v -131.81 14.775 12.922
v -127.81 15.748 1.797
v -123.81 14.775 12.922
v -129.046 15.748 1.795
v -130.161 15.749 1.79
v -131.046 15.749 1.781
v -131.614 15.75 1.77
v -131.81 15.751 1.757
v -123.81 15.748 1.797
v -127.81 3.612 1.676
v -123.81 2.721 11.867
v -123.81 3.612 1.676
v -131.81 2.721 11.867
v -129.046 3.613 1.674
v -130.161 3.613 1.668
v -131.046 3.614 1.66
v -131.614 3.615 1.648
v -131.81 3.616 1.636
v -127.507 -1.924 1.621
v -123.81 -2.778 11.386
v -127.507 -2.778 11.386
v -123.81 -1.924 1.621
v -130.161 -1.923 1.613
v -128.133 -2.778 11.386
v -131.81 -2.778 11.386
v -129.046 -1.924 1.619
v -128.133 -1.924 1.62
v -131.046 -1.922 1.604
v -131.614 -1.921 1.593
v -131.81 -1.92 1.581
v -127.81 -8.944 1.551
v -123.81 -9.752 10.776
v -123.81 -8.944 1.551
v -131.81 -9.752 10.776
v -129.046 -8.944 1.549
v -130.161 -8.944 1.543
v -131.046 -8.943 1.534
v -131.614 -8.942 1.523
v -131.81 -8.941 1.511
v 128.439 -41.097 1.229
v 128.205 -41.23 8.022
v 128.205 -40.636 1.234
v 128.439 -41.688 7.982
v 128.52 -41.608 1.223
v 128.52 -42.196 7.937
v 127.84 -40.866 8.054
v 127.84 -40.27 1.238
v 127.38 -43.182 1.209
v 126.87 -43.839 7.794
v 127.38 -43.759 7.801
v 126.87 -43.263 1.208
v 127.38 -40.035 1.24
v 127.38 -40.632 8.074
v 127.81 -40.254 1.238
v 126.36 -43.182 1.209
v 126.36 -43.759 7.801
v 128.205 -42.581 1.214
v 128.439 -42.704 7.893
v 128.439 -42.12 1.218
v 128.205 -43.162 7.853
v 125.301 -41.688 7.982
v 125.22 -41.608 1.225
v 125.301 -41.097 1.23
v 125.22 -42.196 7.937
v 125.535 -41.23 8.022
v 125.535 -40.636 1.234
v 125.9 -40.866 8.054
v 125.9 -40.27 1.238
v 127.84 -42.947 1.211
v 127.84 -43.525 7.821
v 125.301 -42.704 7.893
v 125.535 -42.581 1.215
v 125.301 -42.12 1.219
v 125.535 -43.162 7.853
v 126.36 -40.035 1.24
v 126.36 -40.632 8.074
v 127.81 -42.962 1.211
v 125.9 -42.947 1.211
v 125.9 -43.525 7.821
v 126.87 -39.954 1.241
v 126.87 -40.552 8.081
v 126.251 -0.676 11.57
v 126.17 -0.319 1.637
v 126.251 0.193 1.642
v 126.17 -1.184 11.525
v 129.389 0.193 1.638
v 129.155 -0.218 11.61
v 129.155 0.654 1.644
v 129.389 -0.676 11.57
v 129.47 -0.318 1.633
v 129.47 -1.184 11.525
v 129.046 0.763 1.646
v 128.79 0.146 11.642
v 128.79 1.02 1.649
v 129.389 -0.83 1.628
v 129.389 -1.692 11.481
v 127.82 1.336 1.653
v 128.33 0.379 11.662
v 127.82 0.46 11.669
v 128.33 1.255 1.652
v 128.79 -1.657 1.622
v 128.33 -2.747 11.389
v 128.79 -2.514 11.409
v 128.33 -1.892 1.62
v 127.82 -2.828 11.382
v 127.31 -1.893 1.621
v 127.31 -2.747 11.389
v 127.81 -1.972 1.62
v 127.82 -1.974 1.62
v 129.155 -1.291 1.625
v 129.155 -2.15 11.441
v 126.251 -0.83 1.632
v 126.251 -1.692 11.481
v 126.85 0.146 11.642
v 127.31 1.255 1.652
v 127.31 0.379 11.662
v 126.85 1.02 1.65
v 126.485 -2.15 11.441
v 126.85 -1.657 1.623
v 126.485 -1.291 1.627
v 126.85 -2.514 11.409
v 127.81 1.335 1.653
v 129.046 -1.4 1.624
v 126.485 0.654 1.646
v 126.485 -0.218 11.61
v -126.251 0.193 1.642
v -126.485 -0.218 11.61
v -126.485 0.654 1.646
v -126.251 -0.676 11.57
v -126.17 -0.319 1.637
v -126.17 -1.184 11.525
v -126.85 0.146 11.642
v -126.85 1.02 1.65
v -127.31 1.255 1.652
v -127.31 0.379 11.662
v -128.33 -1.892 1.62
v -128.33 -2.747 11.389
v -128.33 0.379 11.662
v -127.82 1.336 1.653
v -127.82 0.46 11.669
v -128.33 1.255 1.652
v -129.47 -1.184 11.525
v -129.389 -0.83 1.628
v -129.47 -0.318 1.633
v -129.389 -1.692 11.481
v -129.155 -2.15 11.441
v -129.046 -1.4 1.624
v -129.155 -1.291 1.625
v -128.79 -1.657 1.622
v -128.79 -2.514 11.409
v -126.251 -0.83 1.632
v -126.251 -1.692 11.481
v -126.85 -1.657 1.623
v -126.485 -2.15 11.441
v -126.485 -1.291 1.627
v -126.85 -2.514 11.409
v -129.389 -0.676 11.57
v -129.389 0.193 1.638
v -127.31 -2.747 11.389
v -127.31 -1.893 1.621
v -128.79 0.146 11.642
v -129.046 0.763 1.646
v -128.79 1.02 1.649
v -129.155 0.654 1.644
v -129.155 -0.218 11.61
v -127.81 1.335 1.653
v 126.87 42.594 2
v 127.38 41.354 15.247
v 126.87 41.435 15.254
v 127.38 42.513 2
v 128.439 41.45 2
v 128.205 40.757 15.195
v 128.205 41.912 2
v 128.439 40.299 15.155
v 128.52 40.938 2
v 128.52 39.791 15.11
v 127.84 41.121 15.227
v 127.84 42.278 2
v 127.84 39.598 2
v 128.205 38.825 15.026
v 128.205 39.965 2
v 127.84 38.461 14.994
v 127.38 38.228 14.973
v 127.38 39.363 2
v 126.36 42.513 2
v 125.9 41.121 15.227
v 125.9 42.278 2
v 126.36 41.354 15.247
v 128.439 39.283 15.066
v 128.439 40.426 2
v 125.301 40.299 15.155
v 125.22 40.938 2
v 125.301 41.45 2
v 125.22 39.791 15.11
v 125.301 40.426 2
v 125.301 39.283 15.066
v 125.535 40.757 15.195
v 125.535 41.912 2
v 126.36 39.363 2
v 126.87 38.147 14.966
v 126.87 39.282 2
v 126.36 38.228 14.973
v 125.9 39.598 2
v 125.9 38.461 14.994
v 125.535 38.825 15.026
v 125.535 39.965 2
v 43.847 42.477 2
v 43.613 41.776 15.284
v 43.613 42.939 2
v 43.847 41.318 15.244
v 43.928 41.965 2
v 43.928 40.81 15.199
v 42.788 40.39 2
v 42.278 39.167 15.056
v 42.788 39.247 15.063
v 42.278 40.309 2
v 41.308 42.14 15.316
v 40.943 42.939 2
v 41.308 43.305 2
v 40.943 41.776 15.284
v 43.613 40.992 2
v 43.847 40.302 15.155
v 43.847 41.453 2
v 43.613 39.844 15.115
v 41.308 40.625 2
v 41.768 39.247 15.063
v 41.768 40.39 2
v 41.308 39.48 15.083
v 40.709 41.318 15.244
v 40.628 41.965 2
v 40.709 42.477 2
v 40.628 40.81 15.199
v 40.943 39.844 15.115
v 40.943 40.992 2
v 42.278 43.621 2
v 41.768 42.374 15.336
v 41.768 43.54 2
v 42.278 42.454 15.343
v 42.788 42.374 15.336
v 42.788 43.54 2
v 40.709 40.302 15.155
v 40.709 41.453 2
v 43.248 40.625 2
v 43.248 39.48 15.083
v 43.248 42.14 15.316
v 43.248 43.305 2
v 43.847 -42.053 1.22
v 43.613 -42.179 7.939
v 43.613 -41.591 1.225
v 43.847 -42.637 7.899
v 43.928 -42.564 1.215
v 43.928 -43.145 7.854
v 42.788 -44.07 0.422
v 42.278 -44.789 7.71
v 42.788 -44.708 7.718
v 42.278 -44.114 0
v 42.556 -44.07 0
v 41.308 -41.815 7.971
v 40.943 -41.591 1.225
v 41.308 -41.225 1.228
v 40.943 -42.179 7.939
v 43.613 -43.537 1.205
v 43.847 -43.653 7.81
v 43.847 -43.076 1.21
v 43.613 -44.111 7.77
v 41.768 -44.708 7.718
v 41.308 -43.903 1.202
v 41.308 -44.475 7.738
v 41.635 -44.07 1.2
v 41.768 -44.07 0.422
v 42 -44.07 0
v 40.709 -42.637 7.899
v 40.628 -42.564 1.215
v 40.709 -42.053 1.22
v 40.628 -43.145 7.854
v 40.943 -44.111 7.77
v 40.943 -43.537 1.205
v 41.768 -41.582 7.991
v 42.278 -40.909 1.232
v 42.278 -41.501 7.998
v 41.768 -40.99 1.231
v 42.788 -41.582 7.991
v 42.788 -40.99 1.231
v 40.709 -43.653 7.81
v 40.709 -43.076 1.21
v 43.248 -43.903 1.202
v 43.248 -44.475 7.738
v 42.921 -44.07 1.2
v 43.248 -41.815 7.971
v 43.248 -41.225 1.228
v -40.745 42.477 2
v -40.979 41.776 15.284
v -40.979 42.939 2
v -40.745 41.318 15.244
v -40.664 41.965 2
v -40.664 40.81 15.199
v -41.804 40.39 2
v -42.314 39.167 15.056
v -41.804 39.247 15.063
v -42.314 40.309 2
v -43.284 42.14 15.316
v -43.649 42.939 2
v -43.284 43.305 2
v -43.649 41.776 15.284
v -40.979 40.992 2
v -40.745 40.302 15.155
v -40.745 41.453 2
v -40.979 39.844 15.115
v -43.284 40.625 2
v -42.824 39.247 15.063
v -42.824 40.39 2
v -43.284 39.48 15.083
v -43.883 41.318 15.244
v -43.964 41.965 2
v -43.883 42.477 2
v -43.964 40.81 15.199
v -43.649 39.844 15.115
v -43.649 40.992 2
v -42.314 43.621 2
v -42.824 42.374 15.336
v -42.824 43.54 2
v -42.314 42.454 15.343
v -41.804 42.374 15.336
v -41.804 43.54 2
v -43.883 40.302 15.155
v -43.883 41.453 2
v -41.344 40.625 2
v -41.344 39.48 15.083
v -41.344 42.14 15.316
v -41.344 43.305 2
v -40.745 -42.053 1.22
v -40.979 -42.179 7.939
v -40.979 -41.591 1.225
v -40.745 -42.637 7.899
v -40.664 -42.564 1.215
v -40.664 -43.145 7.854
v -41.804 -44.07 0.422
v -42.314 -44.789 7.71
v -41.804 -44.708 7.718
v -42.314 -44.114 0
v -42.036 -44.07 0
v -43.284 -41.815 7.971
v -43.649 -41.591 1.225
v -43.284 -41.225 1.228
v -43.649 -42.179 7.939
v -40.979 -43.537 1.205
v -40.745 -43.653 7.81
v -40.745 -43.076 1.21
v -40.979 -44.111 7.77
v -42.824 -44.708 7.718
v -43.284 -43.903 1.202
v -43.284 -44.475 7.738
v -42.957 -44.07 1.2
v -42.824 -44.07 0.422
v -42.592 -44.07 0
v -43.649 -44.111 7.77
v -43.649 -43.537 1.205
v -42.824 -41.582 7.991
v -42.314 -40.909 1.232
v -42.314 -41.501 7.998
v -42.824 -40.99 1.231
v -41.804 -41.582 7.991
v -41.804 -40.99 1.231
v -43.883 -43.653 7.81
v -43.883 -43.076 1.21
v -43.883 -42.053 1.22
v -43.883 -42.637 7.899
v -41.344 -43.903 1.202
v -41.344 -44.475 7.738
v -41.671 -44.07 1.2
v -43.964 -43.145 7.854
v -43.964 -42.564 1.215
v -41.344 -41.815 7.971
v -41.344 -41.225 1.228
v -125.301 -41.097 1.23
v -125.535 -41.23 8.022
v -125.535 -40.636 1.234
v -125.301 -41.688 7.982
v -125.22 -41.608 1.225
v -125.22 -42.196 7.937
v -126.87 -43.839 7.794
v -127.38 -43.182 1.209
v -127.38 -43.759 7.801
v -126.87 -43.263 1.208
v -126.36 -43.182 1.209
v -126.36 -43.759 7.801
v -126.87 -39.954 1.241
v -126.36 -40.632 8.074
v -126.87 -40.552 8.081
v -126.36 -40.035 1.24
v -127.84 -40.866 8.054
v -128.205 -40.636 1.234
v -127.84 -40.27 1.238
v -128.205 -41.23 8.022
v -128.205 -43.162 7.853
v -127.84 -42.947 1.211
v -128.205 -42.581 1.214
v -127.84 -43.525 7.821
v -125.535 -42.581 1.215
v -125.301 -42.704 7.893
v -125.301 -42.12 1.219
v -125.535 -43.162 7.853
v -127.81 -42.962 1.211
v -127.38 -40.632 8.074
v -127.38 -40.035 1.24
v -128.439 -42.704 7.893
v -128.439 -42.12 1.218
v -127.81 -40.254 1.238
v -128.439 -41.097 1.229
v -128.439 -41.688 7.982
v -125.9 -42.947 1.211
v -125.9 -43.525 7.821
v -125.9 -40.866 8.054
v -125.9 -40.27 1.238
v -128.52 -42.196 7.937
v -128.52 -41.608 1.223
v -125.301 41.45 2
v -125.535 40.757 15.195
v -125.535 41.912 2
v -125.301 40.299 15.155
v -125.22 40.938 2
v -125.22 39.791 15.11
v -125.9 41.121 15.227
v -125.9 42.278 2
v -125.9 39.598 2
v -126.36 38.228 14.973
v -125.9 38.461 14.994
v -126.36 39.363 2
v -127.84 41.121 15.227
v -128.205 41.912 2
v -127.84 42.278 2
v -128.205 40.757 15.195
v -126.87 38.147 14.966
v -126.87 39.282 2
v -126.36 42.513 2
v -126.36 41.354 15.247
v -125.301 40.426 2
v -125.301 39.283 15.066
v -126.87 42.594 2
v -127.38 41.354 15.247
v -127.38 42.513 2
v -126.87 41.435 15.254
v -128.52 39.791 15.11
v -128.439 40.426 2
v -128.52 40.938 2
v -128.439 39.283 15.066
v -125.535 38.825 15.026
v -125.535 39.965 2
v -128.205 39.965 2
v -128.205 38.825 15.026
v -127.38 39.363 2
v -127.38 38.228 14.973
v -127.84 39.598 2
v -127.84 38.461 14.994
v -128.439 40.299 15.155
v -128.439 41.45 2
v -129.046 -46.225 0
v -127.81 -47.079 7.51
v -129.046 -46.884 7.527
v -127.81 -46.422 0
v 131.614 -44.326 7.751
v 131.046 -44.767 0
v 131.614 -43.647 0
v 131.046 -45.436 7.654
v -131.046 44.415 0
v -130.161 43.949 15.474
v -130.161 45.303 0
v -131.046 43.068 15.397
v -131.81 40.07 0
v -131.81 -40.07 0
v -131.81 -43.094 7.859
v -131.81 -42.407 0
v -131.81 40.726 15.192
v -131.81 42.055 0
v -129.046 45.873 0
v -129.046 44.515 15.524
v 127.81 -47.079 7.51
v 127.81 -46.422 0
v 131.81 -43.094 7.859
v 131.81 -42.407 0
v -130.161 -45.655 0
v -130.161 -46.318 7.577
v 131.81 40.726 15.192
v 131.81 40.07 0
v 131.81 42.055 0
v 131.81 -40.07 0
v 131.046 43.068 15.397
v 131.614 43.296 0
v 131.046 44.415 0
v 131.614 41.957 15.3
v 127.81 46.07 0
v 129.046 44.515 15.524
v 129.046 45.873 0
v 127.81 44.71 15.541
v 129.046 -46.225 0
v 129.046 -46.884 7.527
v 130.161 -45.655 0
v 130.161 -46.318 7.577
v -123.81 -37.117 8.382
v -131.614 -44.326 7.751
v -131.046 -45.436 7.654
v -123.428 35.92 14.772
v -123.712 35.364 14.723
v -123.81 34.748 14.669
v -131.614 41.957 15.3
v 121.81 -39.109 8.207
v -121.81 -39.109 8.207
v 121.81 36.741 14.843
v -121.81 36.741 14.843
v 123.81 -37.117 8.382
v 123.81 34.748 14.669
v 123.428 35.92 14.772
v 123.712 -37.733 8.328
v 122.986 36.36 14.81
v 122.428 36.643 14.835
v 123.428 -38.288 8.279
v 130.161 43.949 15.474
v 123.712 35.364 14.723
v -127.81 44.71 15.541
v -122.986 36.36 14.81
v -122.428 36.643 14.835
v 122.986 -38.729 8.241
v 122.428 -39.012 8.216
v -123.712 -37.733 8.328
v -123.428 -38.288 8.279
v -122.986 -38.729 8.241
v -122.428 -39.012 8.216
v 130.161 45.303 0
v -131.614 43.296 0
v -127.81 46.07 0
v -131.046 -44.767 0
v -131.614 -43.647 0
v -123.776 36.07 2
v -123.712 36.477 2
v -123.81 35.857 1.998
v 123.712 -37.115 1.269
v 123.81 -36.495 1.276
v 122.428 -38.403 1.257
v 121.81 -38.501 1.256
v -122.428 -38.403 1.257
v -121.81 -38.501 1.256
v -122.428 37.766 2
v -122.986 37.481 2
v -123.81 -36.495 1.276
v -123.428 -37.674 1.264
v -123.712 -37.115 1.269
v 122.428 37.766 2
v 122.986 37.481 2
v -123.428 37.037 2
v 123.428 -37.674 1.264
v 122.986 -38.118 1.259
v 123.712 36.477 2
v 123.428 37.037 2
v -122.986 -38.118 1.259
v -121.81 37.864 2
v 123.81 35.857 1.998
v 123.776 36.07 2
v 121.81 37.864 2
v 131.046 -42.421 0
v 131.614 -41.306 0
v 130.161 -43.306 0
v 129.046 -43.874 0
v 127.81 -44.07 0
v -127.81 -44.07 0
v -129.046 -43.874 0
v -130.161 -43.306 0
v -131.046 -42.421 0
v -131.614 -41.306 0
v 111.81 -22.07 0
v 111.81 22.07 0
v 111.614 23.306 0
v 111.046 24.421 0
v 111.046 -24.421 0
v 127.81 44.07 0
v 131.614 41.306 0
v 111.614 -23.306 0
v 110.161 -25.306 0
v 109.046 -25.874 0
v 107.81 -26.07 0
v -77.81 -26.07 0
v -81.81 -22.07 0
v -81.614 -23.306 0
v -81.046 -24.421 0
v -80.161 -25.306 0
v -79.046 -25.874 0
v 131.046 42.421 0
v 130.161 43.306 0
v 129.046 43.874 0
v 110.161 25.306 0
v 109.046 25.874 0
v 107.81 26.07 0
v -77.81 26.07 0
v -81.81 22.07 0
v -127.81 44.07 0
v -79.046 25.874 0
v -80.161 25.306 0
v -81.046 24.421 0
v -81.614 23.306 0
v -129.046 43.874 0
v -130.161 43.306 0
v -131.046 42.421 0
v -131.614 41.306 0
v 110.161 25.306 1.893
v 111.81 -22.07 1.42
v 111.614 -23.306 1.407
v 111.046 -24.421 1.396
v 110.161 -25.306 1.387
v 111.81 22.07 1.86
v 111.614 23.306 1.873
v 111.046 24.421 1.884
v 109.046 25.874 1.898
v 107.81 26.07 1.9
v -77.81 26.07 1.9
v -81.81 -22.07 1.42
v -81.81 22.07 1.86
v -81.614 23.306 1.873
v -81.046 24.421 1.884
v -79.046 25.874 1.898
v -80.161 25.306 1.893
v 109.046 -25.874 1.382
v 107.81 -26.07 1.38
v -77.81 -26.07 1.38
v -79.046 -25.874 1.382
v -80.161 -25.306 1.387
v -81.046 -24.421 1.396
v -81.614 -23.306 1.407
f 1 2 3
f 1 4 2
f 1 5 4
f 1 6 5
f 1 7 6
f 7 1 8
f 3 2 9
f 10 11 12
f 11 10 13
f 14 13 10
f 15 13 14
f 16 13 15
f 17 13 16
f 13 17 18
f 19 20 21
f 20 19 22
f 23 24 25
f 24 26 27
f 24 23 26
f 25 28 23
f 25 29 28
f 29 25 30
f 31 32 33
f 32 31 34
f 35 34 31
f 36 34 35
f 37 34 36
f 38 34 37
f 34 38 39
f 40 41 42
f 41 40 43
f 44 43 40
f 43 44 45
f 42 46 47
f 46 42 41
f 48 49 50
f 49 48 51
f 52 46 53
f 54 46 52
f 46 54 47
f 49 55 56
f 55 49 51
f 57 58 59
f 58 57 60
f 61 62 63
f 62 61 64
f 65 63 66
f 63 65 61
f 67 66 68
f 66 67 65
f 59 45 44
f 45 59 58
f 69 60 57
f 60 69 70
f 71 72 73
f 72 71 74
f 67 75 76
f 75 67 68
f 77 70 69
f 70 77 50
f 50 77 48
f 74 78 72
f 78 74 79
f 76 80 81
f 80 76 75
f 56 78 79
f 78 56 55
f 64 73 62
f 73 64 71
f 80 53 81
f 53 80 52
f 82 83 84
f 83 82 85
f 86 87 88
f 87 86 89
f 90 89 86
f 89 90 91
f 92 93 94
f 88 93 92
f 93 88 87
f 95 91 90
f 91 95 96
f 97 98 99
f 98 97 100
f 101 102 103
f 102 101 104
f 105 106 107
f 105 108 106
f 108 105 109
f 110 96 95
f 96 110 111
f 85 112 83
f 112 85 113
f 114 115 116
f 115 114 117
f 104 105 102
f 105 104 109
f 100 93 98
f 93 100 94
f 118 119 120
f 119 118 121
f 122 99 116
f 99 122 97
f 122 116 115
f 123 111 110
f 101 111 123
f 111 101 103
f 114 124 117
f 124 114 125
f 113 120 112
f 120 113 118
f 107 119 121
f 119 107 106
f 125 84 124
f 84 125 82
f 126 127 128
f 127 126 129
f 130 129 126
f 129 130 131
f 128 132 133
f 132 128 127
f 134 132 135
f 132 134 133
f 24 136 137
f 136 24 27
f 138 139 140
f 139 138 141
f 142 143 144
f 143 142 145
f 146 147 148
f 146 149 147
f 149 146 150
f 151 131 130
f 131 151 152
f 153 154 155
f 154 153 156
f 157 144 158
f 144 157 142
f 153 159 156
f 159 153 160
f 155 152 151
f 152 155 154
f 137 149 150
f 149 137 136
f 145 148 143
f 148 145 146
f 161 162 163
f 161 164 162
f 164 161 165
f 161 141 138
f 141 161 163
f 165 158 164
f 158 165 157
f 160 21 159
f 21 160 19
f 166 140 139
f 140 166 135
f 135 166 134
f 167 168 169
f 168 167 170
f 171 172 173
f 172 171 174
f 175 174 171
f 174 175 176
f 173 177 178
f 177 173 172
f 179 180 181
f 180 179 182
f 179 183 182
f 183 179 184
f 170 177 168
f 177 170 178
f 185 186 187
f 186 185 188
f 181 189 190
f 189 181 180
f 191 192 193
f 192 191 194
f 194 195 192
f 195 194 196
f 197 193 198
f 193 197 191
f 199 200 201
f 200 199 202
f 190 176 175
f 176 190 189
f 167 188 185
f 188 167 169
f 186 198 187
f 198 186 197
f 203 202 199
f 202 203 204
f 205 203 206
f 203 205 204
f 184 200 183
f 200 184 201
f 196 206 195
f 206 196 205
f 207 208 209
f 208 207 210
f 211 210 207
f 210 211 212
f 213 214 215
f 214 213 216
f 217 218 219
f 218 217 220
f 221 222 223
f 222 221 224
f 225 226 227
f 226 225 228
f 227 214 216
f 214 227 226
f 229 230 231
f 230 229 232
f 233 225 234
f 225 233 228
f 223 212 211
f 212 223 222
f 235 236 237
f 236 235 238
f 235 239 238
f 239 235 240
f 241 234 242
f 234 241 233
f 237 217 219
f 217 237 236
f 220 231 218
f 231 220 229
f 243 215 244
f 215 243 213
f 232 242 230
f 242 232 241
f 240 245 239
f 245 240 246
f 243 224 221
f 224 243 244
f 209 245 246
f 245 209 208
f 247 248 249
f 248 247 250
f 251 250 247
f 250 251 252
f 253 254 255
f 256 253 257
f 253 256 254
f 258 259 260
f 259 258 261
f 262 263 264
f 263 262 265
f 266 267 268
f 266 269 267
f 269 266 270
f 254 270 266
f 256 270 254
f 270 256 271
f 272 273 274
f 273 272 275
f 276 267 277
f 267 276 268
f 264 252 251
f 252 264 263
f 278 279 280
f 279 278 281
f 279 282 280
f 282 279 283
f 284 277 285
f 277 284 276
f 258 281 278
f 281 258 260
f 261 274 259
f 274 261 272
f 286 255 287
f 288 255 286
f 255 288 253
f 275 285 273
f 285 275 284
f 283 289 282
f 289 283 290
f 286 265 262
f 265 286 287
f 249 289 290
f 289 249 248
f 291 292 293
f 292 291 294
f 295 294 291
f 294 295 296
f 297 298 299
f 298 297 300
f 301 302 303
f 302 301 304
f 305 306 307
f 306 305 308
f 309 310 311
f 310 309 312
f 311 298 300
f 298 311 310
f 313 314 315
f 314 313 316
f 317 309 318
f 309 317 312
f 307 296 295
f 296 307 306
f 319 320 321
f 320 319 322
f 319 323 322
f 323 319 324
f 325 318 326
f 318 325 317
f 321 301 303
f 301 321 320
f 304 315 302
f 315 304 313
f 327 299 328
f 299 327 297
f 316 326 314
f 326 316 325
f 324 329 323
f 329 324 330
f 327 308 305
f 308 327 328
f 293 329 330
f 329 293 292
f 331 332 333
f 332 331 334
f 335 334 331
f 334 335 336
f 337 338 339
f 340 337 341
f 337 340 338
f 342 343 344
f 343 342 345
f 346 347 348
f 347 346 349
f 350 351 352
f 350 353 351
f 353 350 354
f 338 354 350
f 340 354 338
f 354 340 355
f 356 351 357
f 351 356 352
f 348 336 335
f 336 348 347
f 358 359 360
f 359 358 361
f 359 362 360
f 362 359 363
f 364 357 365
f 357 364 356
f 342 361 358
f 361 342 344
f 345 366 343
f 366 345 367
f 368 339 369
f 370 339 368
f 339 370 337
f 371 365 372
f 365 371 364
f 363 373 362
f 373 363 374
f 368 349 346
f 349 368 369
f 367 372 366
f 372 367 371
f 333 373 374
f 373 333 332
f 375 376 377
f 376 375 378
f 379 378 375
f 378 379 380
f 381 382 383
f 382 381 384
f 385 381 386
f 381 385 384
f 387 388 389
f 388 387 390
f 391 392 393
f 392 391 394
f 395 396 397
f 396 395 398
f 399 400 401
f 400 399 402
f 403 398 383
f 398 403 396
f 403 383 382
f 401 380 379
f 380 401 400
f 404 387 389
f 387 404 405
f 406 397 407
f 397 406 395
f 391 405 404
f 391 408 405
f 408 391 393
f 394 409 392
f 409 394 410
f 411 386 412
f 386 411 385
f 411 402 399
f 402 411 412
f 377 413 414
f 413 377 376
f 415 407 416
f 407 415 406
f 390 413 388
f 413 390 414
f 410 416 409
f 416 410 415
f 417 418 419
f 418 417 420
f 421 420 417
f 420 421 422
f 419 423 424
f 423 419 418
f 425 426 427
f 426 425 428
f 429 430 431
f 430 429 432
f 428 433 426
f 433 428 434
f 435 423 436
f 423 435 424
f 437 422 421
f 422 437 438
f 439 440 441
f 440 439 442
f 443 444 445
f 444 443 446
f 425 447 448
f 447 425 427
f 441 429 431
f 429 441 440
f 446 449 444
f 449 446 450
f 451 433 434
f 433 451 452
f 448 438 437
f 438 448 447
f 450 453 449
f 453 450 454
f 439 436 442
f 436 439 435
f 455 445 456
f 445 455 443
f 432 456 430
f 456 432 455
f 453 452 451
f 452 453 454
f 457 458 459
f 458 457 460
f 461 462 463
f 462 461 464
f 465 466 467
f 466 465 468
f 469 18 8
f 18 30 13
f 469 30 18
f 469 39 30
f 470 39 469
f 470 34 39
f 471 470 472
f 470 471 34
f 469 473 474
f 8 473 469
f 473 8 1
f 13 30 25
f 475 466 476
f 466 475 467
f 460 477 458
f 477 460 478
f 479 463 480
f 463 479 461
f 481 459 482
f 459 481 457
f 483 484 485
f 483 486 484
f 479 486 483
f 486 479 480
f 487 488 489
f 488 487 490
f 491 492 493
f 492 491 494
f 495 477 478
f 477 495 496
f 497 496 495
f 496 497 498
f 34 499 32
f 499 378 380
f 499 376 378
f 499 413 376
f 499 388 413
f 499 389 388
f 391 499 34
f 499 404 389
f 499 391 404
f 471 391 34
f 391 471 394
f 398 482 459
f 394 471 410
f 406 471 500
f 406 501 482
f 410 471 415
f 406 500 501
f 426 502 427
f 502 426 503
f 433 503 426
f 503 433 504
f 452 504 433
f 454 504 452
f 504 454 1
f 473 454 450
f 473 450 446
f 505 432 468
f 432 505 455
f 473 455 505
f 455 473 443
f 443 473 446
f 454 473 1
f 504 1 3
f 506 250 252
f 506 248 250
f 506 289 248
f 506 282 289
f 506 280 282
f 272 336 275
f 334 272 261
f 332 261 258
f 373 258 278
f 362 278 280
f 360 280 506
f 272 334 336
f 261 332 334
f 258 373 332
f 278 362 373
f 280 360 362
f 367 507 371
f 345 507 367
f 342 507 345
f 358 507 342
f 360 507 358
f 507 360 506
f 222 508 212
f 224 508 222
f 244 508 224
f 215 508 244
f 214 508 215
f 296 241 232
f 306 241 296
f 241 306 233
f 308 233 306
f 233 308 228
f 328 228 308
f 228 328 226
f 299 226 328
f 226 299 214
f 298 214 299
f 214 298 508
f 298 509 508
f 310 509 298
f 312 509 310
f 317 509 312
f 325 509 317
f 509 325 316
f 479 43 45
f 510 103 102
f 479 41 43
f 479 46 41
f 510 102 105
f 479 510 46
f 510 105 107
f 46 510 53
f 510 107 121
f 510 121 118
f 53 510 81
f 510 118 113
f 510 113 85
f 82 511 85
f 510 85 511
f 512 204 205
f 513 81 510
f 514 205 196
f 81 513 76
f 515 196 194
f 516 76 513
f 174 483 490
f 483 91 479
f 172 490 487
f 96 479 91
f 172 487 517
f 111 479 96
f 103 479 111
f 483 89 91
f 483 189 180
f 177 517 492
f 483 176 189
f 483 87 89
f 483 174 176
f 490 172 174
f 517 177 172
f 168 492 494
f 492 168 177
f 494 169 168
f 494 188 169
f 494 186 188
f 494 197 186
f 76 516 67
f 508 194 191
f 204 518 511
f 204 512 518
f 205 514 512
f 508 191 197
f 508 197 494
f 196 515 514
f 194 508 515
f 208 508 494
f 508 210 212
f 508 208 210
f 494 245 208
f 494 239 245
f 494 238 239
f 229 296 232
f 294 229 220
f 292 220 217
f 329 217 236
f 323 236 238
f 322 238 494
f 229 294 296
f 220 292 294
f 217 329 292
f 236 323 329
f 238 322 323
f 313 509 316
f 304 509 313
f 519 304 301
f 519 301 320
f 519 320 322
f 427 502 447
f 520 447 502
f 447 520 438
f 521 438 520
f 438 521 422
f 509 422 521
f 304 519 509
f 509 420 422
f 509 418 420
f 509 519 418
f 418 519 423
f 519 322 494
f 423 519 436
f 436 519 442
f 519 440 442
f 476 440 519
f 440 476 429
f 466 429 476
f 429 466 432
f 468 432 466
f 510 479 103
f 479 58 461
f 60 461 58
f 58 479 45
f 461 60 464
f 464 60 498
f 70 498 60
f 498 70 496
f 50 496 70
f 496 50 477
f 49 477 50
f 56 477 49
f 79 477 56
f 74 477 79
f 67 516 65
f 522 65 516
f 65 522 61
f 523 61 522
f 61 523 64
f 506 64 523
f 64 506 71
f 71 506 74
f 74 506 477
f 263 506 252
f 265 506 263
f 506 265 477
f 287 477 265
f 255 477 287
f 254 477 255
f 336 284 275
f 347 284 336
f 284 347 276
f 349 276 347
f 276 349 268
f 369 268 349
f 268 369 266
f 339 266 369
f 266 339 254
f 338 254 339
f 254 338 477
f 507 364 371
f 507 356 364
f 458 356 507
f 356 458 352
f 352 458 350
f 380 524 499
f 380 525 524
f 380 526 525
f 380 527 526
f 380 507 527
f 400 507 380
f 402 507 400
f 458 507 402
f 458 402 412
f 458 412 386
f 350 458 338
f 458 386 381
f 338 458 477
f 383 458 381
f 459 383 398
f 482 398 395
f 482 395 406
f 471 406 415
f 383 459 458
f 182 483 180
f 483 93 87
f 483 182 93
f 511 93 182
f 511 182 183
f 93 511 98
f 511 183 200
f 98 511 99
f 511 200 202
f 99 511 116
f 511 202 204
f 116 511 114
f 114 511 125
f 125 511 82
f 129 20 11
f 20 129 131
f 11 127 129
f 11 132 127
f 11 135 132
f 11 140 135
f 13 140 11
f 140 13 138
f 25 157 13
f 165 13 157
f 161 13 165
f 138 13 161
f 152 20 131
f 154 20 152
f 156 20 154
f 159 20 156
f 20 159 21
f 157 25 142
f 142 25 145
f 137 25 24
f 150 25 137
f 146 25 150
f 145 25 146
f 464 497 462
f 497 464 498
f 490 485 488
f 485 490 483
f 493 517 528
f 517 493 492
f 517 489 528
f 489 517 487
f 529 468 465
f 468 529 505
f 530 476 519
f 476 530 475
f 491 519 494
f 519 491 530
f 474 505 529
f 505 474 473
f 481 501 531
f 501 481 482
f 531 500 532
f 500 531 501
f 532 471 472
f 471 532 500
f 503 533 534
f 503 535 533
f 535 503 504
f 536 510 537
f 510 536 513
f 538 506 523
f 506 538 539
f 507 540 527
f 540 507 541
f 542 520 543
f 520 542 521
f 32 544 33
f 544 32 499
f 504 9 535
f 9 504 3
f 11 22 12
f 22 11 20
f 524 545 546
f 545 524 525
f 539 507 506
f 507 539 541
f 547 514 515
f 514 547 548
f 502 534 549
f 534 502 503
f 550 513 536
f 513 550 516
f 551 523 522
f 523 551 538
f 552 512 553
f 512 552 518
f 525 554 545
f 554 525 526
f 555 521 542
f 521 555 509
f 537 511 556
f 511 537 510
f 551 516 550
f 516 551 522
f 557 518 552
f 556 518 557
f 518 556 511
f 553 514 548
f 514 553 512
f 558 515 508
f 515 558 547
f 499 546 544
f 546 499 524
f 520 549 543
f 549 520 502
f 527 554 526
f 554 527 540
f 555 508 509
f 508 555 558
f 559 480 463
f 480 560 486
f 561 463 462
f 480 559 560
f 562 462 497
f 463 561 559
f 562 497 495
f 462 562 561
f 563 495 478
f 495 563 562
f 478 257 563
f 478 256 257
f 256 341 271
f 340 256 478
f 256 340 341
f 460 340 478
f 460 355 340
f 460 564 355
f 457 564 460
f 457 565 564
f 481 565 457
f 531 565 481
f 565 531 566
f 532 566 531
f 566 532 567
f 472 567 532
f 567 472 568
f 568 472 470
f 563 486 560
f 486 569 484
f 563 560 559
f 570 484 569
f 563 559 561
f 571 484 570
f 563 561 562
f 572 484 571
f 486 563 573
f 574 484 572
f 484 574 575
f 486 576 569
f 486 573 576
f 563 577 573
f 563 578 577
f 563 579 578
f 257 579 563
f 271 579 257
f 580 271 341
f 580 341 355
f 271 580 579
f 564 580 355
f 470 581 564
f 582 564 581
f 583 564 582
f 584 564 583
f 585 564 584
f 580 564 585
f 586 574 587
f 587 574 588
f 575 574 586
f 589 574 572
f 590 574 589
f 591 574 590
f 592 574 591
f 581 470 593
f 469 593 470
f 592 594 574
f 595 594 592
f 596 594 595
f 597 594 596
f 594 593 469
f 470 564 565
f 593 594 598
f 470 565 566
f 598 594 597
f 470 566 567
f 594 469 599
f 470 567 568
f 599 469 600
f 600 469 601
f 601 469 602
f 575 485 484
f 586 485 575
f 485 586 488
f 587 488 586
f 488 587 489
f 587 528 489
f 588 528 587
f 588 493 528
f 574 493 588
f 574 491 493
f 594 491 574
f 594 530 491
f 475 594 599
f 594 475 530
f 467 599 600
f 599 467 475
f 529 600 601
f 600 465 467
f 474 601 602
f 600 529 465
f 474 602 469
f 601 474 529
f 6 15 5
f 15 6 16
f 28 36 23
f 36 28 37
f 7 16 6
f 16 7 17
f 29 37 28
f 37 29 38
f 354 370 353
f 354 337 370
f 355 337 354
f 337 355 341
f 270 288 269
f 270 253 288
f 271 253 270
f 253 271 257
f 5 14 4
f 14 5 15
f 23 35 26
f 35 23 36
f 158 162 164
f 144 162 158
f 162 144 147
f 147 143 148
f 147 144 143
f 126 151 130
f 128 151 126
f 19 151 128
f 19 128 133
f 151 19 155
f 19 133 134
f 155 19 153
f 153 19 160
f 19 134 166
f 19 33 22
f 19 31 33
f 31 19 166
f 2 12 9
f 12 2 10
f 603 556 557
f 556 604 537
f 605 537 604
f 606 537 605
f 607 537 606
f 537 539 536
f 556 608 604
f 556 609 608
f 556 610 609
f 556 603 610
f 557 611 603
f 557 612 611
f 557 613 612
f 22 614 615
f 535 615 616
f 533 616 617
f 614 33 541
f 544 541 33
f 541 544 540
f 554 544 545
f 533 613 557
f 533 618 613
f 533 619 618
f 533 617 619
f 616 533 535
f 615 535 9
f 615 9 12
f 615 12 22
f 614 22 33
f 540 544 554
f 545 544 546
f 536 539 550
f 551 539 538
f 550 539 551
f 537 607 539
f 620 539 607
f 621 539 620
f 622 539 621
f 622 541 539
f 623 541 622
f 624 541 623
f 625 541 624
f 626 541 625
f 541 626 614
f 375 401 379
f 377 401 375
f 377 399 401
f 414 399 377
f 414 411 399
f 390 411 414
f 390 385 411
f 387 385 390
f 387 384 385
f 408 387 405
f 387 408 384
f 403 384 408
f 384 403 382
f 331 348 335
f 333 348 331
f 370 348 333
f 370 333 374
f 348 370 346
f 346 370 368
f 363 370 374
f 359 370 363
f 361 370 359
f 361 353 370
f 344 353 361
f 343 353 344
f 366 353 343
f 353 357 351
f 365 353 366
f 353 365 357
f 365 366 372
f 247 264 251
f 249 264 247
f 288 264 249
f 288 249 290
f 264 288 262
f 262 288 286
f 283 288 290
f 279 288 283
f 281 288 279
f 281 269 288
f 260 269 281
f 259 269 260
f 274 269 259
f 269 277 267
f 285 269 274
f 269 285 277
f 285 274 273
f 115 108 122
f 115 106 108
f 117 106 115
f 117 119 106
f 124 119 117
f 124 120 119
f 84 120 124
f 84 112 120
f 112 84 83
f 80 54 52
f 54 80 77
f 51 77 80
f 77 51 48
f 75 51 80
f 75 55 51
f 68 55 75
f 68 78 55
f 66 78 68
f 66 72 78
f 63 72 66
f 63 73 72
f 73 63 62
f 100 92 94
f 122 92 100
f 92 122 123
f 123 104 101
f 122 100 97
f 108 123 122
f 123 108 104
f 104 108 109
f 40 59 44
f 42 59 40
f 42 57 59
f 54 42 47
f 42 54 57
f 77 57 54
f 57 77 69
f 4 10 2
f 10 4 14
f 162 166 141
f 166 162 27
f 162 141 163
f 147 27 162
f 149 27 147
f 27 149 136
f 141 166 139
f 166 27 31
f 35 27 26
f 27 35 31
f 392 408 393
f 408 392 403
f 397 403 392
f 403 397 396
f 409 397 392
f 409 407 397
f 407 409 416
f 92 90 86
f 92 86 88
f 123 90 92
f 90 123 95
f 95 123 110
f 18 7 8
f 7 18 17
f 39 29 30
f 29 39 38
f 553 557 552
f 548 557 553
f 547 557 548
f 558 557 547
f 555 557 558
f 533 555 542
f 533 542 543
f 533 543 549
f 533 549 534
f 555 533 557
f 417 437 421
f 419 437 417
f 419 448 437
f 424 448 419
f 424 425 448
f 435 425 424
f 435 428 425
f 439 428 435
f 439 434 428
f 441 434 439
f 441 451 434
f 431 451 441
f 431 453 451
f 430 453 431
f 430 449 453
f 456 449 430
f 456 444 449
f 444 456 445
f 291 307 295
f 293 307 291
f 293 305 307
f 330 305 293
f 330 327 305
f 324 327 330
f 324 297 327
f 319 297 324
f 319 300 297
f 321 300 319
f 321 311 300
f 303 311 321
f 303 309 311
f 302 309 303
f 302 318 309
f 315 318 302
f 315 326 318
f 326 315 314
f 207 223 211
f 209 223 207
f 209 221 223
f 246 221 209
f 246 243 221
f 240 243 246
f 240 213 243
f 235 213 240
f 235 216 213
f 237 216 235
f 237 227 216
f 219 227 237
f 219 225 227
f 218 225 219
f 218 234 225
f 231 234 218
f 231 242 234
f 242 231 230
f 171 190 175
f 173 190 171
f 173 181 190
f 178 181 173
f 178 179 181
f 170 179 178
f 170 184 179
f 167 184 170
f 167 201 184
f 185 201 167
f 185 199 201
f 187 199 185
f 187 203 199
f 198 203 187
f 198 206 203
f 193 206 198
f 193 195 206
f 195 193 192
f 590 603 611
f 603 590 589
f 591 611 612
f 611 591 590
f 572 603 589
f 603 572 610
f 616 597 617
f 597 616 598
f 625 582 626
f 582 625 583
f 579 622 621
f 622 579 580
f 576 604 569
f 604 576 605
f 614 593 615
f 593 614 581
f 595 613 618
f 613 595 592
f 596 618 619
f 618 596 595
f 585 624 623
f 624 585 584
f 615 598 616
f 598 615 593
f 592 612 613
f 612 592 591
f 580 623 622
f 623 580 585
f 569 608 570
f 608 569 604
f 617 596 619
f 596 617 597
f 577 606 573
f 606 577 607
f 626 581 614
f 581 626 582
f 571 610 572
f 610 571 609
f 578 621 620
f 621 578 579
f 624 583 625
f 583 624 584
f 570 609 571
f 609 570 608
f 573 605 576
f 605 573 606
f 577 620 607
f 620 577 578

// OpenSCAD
// import("./orig/laplace-mid.stl");

xDim    = 263.62;
yDim    = 92.14;
zDimMax = 15.6;
cRad    = 4;

angle   = 5;
botThickBack  = 2;
botThickFront = 1.2;

xIntDim = xDim-16;
yIntDim = yDim-16;
zIntOff = 1.2;
cIntRad = 2;



$fn=20;

/* no angle */
if (0) difference() {
   form();
   interior();
   cutouts();
}

/* angled */
if (1) {
   difference() {
      translate([0,yDim/2,0]) rotate([angle,0,0]) translate([0,-yDim/2,0]) midExt();
      translate([-xDim/2-1,-yDim/2-1,-30]) cube([xDim+2,yDim+2,30]);
   }
   difference() {
      bot();
      if (1) testCutout();
   }
}

module testCutout() {
   hull() {
      translate([-xDim/2+cRad+50,-yDim/2+cRad+20,-0.1]) cylinder(r=cRad,h=botThickBack+0.2);
      translate([-xDim/2+cRad+50,yDim/2-cRad-20,-0.1]) cylinder(r=cRad,h=botThickBack+0.2);
      translate([xDim/2-cRad-20,-yDim/2+cRad+20,-0.1]) cylinder(r=cRad,h=botThickBack+0.2);
      translate([xDim/2-cRad-20,yDim/2-cRad-20,-0.1]) cylinder(r=cRad,h=botThickBack+0.2);
   }
}

module bot() {
   hull() {
      translate([-xDim/2+cRad,-yDim/2+cRad+2,0]) cylinder(r=cRad,h=botThickFront);
      translate([-xDim/2+cRad,yDim/2-cRad-2,0]) cylinder(r=cRad,h=botThickBack);
      translate([xDim/2-cRad,-yDim/2+cRad+2,0]) cylinder(r=cRad,h=botThickFront);
      translate([xDim/2-cRad,yDim/2-cRad-2,0]) cylinder(r=cRad,h=botThickBack);
   }
}

module midExt() {
   difference() {
      form();
      interior();
      cutouts();
      screwHoles();
   }
}


module form() {
   hull() {
      translate([-xDim/2+cRad,-yDim/2+cRad,0]) cylinder(r=cRad,h=zDimMax);
      translate([-xDim/2+cRad,yDim/2-cRad,0]) cylinder(r=cRad,h=zDimMax);
      translate([xDim/2-cRad,-yDim/2+cRad,0]) cylinder(r=cRad,h=zDimMax);
      translate([xDim/2-cRad,yDim/2-cRad,0]) cylinder(r=cRad,h=zDimMax);
   }
}

module interior() {
   hull() {
      translate([-xIntDim/2+cIntRad,yIntDim/2-cIntRad,zIntOff]) cylinder(r=cIntRad,h=zDimMax);
      translate([xIntDim/2-cIntRad,-yIntDim/2+cIntRad,zIntOff]) cylinder(r=cIntRad,h=zDimMax);
      translate([-xIntDim/2+cIntRad,-yIntDim/2+cIntRad,zIntOff]) cylinder(r=cIntRad,h=zDimMax);
      translate([xIntDim/2-cIntRad,yIntDim/2-cIntRad,zIntOff]) cylinder(r=cIntRad,h=zDimMax);
   }
}

module cutouts() {
   translate([-xDim/2-0.01,3.92,zIntOff]) cube([10,12.1,zDimMax]);
   translate([-xDim/2-0.01,-8.6,zIntOff]) cube([10,7,zDimMax]);
}

module screwHoles() {
   translate([126.87,-41.168,0]) cylinder(d=3.3,h=25);
   translate([127.82,0.000497,0]) cylinder(d=3.3,h=25);
   translate([-127.82,0.000497,0]) cylinder(d=3.3,h=25);
   translate([126.87,41.132,0]) cylinder(d=3.3,h=25);
   translate([42.278,42.155,0]) cylinder(d=3.3,h=25);
   translate([42.278,-42.121,0]) cylinder(d=3.3,h=25);
   translate([-42.314,42.155,0]) cylinder(d=3.3,h=25);
   translate([-42.314,-42.121,0]) cylinder(d=3.3,h=25);
   translate([-126.87,-41.168,0]) cylinder(d=3.3,h=25);
   translate([-126.87,41.132,0]) cylinder(d=3.3,h=25);
}

module altBot() {
linear_extrude(height=botThick) projection(cut=true) translate([0,yDim/2,-botThick]) rotate([angle,0,0]) translate([0,-yDim/2,0]) form();
}
